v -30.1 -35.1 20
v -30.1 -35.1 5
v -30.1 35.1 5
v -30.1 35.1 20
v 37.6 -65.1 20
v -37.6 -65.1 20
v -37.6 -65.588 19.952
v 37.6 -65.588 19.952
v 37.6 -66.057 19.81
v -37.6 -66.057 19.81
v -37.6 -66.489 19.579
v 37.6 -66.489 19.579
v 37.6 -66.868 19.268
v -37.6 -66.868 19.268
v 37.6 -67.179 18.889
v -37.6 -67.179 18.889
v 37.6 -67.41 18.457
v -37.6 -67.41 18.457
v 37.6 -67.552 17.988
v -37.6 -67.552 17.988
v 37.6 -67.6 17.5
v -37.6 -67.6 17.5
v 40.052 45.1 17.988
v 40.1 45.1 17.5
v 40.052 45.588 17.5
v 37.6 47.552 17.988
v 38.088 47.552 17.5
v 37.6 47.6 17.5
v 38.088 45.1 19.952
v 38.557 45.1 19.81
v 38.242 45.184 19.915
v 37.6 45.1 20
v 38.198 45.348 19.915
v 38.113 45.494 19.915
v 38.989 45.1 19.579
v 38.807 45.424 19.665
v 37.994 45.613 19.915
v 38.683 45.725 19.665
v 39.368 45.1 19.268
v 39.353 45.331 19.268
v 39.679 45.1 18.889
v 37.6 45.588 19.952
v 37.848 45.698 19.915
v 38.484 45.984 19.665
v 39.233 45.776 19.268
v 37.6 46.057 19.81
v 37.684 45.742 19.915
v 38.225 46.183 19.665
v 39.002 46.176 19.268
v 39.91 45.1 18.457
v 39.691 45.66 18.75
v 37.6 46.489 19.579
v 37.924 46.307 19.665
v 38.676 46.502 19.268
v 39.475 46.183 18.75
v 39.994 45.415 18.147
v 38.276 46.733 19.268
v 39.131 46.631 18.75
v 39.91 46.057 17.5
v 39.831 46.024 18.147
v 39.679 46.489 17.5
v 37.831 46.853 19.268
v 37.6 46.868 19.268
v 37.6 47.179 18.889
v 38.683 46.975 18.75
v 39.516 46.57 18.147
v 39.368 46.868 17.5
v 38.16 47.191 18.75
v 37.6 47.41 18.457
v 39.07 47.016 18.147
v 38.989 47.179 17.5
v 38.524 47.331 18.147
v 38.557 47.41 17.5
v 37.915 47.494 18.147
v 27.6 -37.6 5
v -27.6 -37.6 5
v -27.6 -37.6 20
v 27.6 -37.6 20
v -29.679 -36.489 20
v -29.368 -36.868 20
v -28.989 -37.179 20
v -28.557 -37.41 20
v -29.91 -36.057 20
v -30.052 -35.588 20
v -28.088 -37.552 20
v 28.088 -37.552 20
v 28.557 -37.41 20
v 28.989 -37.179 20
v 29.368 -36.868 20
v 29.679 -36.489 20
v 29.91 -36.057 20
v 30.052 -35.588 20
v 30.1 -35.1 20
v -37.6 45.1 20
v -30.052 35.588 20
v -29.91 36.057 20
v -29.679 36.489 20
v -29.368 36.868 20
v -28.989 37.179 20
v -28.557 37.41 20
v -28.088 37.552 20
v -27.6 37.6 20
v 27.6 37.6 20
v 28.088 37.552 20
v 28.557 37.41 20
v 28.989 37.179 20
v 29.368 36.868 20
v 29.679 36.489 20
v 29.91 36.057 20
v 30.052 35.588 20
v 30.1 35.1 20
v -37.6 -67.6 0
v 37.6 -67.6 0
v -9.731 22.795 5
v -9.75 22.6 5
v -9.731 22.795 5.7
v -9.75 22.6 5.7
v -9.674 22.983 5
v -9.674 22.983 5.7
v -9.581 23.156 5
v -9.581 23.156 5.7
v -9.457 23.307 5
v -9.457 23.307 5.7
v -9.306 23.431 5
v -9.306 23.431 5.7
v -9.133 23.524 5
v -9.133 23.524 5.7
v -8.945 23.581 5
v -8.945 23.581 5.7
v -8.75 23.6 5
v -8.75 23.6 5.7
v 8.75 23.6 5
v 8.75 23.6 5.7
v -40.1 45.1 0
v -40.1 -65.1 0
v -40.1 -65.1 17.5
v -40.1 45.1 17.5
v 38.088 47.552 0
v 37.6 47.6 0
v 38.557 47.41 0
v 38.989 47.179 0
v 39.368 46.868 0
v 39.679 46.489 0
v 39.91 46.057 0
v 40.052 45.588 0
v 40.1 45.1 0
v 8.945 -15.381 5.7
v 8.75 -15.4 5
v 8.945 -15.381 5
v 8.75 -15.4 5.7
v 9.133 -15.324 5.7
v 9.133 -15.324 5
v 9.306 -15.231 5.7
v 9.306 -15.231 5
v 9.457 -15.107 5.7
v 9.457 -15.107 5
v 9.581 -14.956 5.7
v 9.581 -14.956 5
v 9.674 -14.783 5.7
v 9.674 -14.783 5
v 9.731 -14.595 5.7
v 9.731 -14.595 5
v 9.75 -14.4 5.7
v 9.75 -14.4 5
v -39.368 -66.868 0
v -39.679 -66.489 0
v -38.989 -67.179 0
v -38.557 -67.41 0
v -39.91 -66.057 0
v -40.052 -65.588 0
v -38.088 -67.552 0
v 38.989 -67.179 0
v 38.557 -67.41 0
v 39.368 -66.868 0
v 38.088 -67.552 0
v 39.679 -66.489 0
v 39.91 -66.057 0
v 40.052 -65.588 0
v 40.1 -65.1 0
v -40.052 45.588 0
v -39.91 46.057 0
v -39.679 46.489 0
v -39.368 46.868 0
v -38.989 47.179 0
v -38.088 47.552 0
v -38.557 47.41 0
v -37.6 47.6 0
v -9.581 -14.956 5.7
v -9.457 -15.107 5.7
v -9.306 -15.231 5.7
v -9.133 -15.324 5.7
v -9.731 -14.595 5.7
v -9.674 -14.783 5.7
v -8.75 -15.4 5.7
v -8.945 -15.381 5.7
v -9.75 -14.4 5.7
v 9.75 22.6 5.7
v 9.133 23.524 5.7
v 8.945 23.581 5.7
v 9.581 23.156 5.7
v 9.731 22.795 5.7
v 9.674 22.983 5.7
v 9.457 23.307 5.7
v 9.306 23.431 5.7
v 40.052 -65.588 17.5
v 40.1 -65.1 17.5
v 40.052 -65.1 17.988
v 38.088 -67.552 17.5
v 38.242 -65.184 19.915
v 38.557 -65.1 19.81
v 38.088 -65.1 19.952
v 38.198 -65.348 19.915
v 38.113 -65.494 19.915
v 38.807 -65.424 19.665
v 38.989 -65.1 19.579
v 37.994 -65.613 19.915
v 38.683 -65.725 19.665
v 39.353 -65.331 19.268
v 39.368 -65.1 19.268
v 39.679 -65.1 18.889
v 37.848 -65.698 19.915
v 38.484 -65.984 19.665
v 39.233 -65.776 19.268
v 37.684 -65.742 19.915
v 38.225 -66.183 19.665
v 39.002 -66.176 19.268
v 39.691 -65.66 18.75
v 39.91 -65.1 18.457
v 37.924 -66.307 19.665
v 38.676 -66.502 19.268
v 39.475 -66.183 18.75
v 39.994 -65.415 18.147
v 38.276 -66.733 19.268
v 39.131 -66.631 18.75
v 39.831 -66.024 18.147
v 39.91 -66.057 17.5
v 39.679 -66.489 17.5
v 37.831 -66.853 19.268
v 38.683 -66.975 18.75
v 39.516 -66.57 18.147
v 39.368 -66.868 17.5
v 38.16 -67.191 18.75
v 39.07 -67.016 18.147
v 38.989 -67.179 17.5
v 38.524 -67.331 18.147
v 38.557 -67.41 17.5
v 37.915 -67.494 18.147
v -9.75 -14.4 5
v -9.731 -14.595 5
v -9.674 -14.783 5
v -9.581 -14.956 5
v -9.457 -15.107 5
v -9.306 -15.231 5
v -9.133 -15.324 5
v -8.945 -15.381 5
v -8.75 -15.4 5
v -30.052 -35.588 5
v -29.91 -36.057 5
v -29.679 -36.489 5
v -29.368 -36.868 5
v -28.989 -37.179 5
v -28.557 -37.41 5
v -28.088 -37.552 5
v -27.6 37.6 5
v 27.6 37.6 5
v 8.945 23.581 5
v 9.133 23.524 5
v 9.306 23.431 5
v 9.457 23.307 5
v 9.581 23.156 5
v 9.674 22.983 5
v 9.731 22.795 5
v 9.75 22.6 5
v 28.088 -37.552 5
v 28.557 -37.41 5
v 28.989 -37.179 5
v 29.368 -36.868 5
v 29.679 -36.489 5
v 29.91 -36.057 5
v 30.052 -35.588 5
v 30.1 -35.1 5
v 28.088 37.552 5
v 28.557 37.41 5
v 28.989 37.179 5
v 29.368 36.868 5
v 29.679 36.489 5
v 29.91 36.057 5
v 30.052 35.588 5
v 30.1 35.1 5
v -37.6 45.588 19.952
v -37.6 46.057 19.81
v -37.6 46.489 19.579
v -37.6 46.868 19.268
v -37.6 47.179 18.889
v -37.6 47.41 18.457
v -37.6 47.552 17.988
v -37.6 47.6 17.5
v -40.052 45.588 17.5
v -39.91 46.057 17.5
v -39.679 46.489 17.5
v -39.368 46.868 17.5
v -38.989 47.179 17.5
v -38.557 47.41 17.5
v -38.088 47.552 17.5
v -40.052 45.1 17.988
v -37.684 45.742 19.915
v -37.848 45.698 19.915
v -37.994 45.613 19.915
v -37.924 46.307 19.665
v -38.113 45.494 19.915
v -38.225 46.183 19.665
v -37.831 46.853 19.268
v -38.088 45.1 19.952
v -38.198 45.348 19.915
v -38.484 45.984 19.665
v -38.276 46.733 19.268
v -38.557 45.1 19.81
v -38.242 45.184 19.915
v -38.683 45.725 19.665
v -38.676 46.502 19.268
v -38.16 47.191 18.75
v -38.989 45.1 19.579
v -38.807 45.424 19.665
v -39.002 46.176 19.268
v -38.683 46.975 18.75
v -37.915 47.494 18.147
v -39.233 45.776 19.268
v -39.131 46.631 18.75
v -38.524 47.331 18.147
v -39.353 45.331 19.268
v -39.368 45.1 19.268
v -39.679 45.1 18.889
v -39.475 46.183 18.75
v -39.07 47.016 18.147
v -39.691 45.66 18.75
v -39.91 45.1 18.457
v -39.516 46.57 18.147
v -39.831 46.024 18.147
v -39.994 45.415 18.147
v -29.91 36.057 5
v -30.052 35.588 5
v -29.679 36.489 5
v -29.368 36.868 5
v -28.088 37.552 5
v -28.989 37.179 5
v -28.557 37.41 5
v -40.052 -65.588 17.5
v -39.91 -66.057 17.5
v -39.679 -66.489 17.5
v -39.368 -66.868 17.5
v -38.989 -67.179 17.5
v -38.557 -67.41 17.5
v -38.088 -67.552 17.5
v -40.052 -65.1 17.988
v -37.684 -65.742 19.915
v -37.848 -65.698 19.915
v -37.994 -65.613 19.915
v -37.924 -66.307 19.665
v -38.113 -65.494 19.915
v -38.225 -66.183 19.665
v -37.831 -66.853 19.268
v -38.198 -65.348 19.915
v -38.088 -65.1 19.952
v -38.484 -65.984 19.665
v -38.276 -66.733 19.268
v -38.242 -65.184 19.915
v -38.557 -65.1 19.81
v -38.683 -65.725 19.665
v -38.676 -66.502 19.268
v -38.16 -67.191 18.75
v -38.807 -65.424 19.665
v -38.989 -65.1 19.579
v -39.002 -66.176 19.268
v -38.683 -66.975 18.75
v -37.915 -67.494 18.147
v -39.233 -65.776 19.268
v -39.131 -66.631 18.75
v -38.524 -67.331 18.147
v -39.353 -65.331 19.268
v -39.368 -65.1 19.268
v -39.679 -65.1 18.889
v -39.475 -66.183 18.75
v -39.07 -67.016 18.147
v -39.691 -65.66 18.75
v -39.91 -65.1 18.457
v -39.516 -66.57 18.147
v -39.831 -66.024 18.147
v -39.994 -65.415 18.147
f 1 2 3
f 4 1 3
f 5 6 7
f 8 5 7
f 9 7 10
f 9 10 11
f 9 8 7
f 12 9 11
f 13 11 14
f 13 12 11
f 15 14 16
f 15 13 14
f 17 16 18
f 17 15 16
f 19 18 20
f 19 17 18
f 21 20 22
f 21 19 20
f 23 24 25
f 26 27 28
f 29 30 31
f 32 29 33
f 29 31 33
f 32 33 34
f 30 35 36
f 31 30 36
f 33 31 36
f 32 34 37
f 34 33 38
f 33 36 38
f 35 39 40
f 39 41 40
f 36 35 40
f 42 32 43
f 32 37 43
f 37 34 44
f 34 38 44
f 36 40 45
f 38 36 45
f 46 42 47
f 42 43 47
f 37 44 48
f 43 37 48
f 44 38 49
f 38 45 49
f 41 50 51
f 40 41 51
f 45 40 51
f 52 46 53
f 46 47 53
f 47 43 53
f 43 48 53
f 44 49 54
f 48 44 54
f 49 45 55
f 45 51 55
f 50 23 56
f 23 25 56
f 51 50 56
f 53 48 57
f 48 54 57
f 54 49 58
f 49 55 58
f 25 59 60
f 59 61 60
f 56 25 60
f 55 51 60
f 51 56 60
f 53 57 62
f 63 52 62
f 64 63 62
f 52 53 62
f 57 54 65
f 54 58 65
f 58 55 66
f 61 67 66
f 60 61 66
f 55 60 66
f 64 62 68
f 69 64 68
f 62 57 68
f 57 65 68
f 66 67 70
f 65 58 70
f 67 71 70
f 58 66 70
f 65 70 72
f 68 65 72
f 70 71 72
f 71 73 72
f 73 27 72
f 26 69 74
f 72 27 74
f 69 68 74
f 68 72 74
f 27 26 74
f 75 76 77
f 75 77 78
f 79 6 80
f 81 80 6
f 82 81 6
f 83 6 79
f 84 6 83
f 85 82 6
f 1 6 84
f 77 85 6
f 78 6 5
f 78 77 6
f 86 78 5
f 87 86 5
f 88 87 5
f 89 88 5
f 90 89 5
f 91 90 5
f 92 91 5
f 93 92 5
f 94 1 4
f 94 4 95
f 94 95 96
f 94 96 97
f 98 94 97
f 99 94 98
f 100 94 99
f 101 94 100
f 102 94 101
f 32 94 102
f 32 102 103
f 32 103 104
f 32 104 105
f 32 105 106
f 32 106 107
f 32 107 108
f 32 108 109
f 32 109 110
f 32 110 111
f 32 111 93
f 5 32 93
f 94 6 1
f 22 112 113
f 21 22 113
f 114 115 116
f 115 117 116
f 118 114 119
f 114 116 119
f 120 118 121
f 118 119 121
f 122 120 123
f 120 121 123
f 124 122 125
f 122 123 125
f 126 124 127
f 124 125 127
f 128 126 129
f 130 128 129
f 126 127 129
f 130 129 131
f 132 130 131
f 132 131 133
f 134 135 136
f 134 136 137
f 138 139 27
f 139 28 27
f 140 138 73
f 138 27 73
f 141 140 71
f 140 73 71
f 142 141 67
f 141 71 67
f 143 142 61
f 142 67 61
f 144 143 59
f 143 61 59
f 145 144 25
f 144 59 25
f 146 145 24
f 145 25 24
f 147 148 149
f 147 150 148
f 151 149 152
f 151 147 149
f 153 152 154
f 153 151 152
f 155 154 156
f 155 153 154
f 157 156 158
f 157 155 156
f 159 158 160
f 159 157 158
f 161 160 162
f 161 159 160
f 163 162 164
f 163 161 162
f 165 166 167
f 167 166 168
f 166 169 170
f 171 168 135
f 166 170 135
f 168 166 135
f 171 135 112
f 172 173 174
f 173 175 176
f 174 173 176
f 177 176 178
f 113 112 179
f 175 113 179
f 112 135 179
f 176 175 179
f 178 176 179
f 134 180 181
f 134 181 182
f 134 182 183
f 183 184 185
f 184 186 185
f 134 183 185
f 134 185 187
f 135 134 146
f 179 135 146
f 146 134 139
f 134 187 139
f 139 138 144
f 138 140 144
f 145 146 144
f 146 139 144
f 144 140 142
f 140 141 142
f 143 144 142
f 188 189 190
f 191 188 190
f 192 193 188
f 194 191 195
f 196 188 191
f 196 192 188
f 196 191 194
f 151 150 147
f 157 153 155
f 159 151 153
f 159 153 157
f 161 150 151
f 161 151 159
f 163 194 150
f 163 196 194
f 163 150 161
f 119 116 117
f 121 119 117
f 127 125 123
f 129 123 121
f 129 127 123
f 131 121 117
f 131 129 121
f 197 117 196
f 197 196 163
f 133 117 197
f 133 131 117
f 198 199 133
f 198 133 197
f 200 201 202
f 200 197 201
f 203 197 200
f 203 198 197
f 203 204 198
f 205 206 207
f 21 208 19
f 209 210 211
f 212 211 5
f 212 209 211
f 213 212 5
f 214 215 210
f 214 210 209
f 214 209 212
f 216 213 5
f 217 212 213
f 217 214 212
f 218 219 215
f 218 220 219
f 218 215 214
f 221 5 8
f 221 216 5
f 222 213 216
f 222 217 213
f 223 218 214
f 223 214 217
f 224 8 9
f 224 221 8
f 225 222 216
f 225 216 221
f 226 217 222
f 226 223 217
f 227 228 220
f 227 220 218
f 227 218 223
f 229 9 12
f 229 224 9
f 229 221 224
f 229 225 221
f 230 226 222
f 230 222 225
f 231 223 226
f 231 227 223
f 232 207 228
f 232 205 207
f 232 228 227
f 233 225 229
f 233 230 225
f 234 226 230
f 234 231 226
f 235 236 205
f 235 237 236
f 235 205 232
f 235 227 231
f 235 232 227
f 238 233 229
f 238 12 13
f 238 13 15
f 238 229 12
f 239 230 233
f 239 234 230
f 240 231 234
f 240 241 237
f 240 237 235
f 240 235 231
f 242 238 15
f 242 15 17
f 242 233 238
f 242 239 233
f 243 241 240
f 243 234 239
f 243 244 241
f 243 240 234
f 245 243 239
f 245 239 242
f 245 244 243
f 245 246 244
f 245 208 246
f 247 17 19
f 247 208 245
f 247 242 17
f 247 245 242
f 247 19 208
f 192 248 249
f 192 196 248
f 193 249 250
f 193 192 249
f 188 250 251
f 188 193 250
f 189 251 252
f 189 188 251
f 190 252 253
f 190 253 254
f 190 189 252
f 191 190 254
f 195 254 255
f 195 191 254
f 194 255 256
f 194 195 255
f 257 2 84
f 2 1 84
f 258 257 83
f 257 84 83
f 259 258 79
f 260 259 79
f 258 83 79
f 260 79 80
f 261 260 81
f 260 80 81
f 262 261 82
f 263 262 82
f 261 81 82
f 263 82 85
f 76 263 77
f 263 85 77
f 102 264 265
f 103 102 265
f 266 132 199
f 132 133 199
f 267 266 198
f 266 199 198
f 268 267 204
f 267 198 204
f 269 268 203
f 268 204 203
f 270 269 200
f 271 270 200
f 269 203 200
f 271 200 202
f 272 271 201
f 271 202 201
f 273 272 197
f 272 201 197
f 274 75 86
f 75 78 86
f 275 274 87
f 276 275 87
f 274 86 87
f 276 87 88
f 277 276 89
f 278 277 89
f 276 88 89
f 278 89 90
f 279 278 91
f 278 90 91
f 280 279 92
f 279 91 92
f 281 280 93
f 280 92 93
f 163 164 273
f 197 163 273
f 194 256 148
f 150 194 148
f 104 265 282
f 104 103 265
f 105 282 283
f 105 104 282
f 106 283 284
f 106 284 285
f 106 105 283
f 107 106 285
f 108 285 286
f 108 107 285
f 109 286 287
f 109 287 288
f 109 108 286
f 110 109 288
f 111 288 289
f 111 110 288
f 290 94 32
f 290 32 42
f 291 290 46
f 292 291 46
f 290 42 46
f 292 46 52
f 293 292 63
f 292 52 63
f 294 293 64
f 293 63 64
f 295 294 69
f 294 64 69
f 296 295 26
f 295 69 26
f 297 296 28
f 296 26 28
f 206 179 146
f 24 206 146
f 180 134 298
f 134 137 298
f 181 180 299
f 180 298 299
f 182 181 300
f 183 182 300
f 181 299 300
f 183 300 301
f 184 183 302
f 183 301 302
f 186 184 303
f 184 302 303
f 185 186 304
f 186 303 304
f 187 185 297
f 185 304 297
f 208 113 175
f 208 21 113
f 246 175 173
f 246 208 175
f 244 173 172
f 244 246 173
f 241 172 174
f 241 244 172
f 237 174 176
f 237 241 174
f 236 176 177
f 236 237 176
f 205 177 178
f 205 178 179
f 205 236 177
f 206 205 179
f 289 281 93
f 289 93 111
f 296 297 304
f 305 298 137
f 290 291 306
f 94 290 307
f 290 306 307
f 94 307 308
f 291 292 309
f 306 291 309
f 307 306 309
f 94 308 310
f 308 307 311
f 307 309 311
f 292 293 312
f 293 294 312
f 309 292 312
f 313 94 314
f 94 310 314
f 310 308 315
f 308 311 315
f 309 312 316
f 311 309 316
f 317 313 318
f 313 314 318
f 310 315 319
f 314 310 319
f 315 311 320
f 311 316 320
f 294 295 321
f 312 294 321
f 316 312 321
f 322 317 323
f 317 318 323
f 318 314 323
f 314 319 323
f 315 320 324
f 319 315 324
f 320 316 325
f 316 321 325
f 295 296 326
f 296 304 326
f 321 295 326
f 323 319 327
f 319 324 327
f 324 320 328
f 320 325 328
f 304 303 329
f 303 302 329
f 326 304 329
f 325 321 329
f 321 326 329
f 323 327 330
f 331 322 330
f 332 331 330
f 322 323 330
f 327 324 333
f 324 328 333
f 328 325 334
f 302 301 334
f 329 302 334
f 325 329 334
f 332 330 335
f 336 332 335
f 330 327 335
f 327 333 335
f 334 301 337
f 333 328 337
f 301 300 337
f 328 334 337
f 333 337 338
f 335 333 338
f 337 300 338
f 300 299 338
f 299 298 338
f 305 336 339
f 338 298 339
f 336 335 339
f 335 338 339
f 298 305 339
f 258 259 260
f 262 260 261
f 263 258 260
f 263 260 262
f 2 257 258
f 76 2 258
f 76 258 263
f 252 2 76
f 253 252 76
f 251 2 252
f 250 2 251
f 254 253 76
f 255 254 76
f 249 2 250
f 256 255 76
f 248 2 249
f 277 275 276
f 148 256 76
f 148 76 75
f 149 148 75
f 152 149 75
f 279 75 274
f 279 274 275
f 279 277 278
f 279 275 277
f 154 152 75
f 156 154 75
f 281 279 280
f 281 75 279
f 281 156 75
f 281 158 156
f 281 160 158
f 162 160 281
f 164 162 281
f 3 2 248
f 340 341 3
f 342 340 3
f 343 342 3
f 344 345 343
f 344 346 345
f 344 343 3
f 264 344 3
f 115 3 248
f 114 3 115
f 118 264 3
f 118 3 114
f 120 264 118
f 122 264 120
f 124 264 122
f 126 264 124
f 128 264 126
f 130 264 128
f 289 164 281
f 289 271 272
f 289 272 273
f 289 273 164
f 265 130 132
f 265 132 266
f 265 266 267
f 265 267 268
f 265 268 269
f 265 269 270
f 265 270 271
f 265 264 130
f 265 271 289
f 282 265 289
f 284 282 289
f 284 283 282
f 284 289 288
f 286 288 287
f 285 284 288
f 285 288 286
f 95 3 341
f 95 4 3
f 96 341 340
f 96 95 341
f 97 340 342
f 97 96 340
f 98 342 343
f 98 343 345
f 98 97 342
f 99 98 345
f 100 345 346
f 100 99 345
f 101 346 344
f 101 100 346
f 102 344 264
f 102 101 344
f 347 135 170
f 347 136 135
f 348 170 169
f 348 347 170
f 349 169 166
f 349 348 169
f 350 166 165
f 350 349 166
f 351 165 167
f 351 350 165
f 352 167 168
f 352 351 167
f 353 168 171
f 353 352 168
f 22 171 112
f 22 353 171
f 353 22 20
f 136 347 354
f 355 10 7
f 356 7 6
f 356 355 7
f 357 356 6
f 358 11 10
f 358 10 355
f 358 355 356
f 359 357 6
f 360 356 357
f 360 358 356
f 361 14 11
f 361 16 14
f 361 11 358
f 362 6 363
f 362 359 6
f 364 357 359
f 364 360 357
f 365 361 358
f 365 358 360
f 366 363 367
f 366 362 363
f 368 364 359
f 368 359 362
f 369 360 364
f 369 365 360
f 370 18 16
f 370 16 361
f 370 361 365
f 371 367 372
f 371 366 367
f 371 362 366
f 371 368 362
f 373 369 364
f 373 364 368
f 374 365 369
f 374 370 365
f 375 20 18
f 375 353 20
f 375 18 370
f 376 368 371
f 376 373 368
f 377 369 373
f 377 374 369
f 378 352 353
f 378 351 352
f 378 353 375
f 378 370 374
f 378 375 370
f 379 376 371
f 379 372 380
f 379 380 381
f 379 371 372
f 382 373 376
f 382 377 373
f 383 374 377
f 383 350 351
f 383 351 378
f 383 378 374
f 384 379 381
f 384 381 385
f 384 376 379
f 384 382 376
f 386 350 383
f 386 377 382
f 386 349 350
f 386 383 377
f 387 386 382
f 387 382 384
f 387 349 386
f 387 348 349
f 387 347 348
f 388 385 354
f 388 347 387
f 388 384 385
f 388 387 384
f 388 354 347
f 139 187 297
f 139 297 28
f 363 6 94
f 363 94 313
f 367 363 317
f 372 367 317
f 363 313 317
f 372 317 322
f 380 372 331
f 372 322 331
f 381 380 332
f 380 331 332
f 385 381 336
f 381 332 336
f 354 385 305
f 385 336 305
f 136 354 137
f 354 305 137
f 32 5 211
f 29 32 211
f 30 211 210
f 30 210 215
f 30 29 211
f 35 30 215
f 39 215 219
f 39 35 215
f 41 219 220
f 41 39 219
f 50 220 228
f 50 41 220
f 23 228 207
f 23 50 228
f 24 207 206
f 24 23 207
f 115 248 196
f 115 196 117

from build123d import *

# Parameters (mm, degrees)
F0_W     = 80.2
F0_H     = 115.2
F0_W_2   = 60.2
F0_H_2   = 75.2
F1_DEPTH = 20
F0_W_3   = 19.5
F0_H_3   = 39
F2_DEPTH = 5
F3_R     = 2.5
F4_R     = 2.5
F5_DEPTH = 5.7
F6_R     = 1


with BuildPart() as f1:
    # F0 (on Top) → F1 (new body)
    with BuildSketch(Plane.XY):
        with Locations((0, -10)):
            Rectangle(F0_W, F0_H)
        Rectangle(F0_W_2, F0_H_2, mode=Mode.SUBTRACT)
    extrude(amount=F1_DEPTH)

    # F0 (on Top) → F2 (join)
    with BuildSketch(Plane.XY):
        Rectangle(F0_W_2, F0_H_2)
        with Locations((0, 4.1)):
            Rectangle(F0_W_3, F0_H_3, mode=Mode.SUBTRACT)
    extrude(amount=F2_DEPTH)

    # F3
    f3_edges = [f1.edges().sort_by_distance(p)[0] for p in [
        (-30.1, 37.6, 12.5),
        (30.1, 37.6, 12.5),
        (-30.1, -37.6, 12.5),
        (30.1, -37.6, 12.5),
    ]]
    fillet(f3_edges, radius=F3_R)

    # F4
    f4_edges = [f1.edges().sort_by_distance(p)[0] for p in [
        (-40.1, -67.6, 10),
        (40.1, -67.6, 10),
        (40.1, 47.6, 10),
        (-40.1, 47.6, 10),
        (40.1, -10, 20),
        (0, -67.6, 20),
        (0, 47.6, 20),
        (-40.1, -10, 20),
    ]]
    fillet(f4_edges, radius=F4_R)

    # F0 (on Top) → F5 (join)
    with BuildSketch(Plane.XY):
        with Locations((0, 4.1)):
            Rectangle(F0_W_3, F0_H_3)
    extrude(amount=F5_DEPTH)

    # F6
    f6_edges = [f1.edges().sort_by_distance(p)[0] for p in [
        (-9.75, -15.4, 5.35),
        (9.75, -15.4, 5.35),
        (9.75, 23.6, 5.35),
        (-9.75, 23.6, 5.35),
    ]]
    fillet(f6_edges, radius=F6_R)


solid = f1.part
